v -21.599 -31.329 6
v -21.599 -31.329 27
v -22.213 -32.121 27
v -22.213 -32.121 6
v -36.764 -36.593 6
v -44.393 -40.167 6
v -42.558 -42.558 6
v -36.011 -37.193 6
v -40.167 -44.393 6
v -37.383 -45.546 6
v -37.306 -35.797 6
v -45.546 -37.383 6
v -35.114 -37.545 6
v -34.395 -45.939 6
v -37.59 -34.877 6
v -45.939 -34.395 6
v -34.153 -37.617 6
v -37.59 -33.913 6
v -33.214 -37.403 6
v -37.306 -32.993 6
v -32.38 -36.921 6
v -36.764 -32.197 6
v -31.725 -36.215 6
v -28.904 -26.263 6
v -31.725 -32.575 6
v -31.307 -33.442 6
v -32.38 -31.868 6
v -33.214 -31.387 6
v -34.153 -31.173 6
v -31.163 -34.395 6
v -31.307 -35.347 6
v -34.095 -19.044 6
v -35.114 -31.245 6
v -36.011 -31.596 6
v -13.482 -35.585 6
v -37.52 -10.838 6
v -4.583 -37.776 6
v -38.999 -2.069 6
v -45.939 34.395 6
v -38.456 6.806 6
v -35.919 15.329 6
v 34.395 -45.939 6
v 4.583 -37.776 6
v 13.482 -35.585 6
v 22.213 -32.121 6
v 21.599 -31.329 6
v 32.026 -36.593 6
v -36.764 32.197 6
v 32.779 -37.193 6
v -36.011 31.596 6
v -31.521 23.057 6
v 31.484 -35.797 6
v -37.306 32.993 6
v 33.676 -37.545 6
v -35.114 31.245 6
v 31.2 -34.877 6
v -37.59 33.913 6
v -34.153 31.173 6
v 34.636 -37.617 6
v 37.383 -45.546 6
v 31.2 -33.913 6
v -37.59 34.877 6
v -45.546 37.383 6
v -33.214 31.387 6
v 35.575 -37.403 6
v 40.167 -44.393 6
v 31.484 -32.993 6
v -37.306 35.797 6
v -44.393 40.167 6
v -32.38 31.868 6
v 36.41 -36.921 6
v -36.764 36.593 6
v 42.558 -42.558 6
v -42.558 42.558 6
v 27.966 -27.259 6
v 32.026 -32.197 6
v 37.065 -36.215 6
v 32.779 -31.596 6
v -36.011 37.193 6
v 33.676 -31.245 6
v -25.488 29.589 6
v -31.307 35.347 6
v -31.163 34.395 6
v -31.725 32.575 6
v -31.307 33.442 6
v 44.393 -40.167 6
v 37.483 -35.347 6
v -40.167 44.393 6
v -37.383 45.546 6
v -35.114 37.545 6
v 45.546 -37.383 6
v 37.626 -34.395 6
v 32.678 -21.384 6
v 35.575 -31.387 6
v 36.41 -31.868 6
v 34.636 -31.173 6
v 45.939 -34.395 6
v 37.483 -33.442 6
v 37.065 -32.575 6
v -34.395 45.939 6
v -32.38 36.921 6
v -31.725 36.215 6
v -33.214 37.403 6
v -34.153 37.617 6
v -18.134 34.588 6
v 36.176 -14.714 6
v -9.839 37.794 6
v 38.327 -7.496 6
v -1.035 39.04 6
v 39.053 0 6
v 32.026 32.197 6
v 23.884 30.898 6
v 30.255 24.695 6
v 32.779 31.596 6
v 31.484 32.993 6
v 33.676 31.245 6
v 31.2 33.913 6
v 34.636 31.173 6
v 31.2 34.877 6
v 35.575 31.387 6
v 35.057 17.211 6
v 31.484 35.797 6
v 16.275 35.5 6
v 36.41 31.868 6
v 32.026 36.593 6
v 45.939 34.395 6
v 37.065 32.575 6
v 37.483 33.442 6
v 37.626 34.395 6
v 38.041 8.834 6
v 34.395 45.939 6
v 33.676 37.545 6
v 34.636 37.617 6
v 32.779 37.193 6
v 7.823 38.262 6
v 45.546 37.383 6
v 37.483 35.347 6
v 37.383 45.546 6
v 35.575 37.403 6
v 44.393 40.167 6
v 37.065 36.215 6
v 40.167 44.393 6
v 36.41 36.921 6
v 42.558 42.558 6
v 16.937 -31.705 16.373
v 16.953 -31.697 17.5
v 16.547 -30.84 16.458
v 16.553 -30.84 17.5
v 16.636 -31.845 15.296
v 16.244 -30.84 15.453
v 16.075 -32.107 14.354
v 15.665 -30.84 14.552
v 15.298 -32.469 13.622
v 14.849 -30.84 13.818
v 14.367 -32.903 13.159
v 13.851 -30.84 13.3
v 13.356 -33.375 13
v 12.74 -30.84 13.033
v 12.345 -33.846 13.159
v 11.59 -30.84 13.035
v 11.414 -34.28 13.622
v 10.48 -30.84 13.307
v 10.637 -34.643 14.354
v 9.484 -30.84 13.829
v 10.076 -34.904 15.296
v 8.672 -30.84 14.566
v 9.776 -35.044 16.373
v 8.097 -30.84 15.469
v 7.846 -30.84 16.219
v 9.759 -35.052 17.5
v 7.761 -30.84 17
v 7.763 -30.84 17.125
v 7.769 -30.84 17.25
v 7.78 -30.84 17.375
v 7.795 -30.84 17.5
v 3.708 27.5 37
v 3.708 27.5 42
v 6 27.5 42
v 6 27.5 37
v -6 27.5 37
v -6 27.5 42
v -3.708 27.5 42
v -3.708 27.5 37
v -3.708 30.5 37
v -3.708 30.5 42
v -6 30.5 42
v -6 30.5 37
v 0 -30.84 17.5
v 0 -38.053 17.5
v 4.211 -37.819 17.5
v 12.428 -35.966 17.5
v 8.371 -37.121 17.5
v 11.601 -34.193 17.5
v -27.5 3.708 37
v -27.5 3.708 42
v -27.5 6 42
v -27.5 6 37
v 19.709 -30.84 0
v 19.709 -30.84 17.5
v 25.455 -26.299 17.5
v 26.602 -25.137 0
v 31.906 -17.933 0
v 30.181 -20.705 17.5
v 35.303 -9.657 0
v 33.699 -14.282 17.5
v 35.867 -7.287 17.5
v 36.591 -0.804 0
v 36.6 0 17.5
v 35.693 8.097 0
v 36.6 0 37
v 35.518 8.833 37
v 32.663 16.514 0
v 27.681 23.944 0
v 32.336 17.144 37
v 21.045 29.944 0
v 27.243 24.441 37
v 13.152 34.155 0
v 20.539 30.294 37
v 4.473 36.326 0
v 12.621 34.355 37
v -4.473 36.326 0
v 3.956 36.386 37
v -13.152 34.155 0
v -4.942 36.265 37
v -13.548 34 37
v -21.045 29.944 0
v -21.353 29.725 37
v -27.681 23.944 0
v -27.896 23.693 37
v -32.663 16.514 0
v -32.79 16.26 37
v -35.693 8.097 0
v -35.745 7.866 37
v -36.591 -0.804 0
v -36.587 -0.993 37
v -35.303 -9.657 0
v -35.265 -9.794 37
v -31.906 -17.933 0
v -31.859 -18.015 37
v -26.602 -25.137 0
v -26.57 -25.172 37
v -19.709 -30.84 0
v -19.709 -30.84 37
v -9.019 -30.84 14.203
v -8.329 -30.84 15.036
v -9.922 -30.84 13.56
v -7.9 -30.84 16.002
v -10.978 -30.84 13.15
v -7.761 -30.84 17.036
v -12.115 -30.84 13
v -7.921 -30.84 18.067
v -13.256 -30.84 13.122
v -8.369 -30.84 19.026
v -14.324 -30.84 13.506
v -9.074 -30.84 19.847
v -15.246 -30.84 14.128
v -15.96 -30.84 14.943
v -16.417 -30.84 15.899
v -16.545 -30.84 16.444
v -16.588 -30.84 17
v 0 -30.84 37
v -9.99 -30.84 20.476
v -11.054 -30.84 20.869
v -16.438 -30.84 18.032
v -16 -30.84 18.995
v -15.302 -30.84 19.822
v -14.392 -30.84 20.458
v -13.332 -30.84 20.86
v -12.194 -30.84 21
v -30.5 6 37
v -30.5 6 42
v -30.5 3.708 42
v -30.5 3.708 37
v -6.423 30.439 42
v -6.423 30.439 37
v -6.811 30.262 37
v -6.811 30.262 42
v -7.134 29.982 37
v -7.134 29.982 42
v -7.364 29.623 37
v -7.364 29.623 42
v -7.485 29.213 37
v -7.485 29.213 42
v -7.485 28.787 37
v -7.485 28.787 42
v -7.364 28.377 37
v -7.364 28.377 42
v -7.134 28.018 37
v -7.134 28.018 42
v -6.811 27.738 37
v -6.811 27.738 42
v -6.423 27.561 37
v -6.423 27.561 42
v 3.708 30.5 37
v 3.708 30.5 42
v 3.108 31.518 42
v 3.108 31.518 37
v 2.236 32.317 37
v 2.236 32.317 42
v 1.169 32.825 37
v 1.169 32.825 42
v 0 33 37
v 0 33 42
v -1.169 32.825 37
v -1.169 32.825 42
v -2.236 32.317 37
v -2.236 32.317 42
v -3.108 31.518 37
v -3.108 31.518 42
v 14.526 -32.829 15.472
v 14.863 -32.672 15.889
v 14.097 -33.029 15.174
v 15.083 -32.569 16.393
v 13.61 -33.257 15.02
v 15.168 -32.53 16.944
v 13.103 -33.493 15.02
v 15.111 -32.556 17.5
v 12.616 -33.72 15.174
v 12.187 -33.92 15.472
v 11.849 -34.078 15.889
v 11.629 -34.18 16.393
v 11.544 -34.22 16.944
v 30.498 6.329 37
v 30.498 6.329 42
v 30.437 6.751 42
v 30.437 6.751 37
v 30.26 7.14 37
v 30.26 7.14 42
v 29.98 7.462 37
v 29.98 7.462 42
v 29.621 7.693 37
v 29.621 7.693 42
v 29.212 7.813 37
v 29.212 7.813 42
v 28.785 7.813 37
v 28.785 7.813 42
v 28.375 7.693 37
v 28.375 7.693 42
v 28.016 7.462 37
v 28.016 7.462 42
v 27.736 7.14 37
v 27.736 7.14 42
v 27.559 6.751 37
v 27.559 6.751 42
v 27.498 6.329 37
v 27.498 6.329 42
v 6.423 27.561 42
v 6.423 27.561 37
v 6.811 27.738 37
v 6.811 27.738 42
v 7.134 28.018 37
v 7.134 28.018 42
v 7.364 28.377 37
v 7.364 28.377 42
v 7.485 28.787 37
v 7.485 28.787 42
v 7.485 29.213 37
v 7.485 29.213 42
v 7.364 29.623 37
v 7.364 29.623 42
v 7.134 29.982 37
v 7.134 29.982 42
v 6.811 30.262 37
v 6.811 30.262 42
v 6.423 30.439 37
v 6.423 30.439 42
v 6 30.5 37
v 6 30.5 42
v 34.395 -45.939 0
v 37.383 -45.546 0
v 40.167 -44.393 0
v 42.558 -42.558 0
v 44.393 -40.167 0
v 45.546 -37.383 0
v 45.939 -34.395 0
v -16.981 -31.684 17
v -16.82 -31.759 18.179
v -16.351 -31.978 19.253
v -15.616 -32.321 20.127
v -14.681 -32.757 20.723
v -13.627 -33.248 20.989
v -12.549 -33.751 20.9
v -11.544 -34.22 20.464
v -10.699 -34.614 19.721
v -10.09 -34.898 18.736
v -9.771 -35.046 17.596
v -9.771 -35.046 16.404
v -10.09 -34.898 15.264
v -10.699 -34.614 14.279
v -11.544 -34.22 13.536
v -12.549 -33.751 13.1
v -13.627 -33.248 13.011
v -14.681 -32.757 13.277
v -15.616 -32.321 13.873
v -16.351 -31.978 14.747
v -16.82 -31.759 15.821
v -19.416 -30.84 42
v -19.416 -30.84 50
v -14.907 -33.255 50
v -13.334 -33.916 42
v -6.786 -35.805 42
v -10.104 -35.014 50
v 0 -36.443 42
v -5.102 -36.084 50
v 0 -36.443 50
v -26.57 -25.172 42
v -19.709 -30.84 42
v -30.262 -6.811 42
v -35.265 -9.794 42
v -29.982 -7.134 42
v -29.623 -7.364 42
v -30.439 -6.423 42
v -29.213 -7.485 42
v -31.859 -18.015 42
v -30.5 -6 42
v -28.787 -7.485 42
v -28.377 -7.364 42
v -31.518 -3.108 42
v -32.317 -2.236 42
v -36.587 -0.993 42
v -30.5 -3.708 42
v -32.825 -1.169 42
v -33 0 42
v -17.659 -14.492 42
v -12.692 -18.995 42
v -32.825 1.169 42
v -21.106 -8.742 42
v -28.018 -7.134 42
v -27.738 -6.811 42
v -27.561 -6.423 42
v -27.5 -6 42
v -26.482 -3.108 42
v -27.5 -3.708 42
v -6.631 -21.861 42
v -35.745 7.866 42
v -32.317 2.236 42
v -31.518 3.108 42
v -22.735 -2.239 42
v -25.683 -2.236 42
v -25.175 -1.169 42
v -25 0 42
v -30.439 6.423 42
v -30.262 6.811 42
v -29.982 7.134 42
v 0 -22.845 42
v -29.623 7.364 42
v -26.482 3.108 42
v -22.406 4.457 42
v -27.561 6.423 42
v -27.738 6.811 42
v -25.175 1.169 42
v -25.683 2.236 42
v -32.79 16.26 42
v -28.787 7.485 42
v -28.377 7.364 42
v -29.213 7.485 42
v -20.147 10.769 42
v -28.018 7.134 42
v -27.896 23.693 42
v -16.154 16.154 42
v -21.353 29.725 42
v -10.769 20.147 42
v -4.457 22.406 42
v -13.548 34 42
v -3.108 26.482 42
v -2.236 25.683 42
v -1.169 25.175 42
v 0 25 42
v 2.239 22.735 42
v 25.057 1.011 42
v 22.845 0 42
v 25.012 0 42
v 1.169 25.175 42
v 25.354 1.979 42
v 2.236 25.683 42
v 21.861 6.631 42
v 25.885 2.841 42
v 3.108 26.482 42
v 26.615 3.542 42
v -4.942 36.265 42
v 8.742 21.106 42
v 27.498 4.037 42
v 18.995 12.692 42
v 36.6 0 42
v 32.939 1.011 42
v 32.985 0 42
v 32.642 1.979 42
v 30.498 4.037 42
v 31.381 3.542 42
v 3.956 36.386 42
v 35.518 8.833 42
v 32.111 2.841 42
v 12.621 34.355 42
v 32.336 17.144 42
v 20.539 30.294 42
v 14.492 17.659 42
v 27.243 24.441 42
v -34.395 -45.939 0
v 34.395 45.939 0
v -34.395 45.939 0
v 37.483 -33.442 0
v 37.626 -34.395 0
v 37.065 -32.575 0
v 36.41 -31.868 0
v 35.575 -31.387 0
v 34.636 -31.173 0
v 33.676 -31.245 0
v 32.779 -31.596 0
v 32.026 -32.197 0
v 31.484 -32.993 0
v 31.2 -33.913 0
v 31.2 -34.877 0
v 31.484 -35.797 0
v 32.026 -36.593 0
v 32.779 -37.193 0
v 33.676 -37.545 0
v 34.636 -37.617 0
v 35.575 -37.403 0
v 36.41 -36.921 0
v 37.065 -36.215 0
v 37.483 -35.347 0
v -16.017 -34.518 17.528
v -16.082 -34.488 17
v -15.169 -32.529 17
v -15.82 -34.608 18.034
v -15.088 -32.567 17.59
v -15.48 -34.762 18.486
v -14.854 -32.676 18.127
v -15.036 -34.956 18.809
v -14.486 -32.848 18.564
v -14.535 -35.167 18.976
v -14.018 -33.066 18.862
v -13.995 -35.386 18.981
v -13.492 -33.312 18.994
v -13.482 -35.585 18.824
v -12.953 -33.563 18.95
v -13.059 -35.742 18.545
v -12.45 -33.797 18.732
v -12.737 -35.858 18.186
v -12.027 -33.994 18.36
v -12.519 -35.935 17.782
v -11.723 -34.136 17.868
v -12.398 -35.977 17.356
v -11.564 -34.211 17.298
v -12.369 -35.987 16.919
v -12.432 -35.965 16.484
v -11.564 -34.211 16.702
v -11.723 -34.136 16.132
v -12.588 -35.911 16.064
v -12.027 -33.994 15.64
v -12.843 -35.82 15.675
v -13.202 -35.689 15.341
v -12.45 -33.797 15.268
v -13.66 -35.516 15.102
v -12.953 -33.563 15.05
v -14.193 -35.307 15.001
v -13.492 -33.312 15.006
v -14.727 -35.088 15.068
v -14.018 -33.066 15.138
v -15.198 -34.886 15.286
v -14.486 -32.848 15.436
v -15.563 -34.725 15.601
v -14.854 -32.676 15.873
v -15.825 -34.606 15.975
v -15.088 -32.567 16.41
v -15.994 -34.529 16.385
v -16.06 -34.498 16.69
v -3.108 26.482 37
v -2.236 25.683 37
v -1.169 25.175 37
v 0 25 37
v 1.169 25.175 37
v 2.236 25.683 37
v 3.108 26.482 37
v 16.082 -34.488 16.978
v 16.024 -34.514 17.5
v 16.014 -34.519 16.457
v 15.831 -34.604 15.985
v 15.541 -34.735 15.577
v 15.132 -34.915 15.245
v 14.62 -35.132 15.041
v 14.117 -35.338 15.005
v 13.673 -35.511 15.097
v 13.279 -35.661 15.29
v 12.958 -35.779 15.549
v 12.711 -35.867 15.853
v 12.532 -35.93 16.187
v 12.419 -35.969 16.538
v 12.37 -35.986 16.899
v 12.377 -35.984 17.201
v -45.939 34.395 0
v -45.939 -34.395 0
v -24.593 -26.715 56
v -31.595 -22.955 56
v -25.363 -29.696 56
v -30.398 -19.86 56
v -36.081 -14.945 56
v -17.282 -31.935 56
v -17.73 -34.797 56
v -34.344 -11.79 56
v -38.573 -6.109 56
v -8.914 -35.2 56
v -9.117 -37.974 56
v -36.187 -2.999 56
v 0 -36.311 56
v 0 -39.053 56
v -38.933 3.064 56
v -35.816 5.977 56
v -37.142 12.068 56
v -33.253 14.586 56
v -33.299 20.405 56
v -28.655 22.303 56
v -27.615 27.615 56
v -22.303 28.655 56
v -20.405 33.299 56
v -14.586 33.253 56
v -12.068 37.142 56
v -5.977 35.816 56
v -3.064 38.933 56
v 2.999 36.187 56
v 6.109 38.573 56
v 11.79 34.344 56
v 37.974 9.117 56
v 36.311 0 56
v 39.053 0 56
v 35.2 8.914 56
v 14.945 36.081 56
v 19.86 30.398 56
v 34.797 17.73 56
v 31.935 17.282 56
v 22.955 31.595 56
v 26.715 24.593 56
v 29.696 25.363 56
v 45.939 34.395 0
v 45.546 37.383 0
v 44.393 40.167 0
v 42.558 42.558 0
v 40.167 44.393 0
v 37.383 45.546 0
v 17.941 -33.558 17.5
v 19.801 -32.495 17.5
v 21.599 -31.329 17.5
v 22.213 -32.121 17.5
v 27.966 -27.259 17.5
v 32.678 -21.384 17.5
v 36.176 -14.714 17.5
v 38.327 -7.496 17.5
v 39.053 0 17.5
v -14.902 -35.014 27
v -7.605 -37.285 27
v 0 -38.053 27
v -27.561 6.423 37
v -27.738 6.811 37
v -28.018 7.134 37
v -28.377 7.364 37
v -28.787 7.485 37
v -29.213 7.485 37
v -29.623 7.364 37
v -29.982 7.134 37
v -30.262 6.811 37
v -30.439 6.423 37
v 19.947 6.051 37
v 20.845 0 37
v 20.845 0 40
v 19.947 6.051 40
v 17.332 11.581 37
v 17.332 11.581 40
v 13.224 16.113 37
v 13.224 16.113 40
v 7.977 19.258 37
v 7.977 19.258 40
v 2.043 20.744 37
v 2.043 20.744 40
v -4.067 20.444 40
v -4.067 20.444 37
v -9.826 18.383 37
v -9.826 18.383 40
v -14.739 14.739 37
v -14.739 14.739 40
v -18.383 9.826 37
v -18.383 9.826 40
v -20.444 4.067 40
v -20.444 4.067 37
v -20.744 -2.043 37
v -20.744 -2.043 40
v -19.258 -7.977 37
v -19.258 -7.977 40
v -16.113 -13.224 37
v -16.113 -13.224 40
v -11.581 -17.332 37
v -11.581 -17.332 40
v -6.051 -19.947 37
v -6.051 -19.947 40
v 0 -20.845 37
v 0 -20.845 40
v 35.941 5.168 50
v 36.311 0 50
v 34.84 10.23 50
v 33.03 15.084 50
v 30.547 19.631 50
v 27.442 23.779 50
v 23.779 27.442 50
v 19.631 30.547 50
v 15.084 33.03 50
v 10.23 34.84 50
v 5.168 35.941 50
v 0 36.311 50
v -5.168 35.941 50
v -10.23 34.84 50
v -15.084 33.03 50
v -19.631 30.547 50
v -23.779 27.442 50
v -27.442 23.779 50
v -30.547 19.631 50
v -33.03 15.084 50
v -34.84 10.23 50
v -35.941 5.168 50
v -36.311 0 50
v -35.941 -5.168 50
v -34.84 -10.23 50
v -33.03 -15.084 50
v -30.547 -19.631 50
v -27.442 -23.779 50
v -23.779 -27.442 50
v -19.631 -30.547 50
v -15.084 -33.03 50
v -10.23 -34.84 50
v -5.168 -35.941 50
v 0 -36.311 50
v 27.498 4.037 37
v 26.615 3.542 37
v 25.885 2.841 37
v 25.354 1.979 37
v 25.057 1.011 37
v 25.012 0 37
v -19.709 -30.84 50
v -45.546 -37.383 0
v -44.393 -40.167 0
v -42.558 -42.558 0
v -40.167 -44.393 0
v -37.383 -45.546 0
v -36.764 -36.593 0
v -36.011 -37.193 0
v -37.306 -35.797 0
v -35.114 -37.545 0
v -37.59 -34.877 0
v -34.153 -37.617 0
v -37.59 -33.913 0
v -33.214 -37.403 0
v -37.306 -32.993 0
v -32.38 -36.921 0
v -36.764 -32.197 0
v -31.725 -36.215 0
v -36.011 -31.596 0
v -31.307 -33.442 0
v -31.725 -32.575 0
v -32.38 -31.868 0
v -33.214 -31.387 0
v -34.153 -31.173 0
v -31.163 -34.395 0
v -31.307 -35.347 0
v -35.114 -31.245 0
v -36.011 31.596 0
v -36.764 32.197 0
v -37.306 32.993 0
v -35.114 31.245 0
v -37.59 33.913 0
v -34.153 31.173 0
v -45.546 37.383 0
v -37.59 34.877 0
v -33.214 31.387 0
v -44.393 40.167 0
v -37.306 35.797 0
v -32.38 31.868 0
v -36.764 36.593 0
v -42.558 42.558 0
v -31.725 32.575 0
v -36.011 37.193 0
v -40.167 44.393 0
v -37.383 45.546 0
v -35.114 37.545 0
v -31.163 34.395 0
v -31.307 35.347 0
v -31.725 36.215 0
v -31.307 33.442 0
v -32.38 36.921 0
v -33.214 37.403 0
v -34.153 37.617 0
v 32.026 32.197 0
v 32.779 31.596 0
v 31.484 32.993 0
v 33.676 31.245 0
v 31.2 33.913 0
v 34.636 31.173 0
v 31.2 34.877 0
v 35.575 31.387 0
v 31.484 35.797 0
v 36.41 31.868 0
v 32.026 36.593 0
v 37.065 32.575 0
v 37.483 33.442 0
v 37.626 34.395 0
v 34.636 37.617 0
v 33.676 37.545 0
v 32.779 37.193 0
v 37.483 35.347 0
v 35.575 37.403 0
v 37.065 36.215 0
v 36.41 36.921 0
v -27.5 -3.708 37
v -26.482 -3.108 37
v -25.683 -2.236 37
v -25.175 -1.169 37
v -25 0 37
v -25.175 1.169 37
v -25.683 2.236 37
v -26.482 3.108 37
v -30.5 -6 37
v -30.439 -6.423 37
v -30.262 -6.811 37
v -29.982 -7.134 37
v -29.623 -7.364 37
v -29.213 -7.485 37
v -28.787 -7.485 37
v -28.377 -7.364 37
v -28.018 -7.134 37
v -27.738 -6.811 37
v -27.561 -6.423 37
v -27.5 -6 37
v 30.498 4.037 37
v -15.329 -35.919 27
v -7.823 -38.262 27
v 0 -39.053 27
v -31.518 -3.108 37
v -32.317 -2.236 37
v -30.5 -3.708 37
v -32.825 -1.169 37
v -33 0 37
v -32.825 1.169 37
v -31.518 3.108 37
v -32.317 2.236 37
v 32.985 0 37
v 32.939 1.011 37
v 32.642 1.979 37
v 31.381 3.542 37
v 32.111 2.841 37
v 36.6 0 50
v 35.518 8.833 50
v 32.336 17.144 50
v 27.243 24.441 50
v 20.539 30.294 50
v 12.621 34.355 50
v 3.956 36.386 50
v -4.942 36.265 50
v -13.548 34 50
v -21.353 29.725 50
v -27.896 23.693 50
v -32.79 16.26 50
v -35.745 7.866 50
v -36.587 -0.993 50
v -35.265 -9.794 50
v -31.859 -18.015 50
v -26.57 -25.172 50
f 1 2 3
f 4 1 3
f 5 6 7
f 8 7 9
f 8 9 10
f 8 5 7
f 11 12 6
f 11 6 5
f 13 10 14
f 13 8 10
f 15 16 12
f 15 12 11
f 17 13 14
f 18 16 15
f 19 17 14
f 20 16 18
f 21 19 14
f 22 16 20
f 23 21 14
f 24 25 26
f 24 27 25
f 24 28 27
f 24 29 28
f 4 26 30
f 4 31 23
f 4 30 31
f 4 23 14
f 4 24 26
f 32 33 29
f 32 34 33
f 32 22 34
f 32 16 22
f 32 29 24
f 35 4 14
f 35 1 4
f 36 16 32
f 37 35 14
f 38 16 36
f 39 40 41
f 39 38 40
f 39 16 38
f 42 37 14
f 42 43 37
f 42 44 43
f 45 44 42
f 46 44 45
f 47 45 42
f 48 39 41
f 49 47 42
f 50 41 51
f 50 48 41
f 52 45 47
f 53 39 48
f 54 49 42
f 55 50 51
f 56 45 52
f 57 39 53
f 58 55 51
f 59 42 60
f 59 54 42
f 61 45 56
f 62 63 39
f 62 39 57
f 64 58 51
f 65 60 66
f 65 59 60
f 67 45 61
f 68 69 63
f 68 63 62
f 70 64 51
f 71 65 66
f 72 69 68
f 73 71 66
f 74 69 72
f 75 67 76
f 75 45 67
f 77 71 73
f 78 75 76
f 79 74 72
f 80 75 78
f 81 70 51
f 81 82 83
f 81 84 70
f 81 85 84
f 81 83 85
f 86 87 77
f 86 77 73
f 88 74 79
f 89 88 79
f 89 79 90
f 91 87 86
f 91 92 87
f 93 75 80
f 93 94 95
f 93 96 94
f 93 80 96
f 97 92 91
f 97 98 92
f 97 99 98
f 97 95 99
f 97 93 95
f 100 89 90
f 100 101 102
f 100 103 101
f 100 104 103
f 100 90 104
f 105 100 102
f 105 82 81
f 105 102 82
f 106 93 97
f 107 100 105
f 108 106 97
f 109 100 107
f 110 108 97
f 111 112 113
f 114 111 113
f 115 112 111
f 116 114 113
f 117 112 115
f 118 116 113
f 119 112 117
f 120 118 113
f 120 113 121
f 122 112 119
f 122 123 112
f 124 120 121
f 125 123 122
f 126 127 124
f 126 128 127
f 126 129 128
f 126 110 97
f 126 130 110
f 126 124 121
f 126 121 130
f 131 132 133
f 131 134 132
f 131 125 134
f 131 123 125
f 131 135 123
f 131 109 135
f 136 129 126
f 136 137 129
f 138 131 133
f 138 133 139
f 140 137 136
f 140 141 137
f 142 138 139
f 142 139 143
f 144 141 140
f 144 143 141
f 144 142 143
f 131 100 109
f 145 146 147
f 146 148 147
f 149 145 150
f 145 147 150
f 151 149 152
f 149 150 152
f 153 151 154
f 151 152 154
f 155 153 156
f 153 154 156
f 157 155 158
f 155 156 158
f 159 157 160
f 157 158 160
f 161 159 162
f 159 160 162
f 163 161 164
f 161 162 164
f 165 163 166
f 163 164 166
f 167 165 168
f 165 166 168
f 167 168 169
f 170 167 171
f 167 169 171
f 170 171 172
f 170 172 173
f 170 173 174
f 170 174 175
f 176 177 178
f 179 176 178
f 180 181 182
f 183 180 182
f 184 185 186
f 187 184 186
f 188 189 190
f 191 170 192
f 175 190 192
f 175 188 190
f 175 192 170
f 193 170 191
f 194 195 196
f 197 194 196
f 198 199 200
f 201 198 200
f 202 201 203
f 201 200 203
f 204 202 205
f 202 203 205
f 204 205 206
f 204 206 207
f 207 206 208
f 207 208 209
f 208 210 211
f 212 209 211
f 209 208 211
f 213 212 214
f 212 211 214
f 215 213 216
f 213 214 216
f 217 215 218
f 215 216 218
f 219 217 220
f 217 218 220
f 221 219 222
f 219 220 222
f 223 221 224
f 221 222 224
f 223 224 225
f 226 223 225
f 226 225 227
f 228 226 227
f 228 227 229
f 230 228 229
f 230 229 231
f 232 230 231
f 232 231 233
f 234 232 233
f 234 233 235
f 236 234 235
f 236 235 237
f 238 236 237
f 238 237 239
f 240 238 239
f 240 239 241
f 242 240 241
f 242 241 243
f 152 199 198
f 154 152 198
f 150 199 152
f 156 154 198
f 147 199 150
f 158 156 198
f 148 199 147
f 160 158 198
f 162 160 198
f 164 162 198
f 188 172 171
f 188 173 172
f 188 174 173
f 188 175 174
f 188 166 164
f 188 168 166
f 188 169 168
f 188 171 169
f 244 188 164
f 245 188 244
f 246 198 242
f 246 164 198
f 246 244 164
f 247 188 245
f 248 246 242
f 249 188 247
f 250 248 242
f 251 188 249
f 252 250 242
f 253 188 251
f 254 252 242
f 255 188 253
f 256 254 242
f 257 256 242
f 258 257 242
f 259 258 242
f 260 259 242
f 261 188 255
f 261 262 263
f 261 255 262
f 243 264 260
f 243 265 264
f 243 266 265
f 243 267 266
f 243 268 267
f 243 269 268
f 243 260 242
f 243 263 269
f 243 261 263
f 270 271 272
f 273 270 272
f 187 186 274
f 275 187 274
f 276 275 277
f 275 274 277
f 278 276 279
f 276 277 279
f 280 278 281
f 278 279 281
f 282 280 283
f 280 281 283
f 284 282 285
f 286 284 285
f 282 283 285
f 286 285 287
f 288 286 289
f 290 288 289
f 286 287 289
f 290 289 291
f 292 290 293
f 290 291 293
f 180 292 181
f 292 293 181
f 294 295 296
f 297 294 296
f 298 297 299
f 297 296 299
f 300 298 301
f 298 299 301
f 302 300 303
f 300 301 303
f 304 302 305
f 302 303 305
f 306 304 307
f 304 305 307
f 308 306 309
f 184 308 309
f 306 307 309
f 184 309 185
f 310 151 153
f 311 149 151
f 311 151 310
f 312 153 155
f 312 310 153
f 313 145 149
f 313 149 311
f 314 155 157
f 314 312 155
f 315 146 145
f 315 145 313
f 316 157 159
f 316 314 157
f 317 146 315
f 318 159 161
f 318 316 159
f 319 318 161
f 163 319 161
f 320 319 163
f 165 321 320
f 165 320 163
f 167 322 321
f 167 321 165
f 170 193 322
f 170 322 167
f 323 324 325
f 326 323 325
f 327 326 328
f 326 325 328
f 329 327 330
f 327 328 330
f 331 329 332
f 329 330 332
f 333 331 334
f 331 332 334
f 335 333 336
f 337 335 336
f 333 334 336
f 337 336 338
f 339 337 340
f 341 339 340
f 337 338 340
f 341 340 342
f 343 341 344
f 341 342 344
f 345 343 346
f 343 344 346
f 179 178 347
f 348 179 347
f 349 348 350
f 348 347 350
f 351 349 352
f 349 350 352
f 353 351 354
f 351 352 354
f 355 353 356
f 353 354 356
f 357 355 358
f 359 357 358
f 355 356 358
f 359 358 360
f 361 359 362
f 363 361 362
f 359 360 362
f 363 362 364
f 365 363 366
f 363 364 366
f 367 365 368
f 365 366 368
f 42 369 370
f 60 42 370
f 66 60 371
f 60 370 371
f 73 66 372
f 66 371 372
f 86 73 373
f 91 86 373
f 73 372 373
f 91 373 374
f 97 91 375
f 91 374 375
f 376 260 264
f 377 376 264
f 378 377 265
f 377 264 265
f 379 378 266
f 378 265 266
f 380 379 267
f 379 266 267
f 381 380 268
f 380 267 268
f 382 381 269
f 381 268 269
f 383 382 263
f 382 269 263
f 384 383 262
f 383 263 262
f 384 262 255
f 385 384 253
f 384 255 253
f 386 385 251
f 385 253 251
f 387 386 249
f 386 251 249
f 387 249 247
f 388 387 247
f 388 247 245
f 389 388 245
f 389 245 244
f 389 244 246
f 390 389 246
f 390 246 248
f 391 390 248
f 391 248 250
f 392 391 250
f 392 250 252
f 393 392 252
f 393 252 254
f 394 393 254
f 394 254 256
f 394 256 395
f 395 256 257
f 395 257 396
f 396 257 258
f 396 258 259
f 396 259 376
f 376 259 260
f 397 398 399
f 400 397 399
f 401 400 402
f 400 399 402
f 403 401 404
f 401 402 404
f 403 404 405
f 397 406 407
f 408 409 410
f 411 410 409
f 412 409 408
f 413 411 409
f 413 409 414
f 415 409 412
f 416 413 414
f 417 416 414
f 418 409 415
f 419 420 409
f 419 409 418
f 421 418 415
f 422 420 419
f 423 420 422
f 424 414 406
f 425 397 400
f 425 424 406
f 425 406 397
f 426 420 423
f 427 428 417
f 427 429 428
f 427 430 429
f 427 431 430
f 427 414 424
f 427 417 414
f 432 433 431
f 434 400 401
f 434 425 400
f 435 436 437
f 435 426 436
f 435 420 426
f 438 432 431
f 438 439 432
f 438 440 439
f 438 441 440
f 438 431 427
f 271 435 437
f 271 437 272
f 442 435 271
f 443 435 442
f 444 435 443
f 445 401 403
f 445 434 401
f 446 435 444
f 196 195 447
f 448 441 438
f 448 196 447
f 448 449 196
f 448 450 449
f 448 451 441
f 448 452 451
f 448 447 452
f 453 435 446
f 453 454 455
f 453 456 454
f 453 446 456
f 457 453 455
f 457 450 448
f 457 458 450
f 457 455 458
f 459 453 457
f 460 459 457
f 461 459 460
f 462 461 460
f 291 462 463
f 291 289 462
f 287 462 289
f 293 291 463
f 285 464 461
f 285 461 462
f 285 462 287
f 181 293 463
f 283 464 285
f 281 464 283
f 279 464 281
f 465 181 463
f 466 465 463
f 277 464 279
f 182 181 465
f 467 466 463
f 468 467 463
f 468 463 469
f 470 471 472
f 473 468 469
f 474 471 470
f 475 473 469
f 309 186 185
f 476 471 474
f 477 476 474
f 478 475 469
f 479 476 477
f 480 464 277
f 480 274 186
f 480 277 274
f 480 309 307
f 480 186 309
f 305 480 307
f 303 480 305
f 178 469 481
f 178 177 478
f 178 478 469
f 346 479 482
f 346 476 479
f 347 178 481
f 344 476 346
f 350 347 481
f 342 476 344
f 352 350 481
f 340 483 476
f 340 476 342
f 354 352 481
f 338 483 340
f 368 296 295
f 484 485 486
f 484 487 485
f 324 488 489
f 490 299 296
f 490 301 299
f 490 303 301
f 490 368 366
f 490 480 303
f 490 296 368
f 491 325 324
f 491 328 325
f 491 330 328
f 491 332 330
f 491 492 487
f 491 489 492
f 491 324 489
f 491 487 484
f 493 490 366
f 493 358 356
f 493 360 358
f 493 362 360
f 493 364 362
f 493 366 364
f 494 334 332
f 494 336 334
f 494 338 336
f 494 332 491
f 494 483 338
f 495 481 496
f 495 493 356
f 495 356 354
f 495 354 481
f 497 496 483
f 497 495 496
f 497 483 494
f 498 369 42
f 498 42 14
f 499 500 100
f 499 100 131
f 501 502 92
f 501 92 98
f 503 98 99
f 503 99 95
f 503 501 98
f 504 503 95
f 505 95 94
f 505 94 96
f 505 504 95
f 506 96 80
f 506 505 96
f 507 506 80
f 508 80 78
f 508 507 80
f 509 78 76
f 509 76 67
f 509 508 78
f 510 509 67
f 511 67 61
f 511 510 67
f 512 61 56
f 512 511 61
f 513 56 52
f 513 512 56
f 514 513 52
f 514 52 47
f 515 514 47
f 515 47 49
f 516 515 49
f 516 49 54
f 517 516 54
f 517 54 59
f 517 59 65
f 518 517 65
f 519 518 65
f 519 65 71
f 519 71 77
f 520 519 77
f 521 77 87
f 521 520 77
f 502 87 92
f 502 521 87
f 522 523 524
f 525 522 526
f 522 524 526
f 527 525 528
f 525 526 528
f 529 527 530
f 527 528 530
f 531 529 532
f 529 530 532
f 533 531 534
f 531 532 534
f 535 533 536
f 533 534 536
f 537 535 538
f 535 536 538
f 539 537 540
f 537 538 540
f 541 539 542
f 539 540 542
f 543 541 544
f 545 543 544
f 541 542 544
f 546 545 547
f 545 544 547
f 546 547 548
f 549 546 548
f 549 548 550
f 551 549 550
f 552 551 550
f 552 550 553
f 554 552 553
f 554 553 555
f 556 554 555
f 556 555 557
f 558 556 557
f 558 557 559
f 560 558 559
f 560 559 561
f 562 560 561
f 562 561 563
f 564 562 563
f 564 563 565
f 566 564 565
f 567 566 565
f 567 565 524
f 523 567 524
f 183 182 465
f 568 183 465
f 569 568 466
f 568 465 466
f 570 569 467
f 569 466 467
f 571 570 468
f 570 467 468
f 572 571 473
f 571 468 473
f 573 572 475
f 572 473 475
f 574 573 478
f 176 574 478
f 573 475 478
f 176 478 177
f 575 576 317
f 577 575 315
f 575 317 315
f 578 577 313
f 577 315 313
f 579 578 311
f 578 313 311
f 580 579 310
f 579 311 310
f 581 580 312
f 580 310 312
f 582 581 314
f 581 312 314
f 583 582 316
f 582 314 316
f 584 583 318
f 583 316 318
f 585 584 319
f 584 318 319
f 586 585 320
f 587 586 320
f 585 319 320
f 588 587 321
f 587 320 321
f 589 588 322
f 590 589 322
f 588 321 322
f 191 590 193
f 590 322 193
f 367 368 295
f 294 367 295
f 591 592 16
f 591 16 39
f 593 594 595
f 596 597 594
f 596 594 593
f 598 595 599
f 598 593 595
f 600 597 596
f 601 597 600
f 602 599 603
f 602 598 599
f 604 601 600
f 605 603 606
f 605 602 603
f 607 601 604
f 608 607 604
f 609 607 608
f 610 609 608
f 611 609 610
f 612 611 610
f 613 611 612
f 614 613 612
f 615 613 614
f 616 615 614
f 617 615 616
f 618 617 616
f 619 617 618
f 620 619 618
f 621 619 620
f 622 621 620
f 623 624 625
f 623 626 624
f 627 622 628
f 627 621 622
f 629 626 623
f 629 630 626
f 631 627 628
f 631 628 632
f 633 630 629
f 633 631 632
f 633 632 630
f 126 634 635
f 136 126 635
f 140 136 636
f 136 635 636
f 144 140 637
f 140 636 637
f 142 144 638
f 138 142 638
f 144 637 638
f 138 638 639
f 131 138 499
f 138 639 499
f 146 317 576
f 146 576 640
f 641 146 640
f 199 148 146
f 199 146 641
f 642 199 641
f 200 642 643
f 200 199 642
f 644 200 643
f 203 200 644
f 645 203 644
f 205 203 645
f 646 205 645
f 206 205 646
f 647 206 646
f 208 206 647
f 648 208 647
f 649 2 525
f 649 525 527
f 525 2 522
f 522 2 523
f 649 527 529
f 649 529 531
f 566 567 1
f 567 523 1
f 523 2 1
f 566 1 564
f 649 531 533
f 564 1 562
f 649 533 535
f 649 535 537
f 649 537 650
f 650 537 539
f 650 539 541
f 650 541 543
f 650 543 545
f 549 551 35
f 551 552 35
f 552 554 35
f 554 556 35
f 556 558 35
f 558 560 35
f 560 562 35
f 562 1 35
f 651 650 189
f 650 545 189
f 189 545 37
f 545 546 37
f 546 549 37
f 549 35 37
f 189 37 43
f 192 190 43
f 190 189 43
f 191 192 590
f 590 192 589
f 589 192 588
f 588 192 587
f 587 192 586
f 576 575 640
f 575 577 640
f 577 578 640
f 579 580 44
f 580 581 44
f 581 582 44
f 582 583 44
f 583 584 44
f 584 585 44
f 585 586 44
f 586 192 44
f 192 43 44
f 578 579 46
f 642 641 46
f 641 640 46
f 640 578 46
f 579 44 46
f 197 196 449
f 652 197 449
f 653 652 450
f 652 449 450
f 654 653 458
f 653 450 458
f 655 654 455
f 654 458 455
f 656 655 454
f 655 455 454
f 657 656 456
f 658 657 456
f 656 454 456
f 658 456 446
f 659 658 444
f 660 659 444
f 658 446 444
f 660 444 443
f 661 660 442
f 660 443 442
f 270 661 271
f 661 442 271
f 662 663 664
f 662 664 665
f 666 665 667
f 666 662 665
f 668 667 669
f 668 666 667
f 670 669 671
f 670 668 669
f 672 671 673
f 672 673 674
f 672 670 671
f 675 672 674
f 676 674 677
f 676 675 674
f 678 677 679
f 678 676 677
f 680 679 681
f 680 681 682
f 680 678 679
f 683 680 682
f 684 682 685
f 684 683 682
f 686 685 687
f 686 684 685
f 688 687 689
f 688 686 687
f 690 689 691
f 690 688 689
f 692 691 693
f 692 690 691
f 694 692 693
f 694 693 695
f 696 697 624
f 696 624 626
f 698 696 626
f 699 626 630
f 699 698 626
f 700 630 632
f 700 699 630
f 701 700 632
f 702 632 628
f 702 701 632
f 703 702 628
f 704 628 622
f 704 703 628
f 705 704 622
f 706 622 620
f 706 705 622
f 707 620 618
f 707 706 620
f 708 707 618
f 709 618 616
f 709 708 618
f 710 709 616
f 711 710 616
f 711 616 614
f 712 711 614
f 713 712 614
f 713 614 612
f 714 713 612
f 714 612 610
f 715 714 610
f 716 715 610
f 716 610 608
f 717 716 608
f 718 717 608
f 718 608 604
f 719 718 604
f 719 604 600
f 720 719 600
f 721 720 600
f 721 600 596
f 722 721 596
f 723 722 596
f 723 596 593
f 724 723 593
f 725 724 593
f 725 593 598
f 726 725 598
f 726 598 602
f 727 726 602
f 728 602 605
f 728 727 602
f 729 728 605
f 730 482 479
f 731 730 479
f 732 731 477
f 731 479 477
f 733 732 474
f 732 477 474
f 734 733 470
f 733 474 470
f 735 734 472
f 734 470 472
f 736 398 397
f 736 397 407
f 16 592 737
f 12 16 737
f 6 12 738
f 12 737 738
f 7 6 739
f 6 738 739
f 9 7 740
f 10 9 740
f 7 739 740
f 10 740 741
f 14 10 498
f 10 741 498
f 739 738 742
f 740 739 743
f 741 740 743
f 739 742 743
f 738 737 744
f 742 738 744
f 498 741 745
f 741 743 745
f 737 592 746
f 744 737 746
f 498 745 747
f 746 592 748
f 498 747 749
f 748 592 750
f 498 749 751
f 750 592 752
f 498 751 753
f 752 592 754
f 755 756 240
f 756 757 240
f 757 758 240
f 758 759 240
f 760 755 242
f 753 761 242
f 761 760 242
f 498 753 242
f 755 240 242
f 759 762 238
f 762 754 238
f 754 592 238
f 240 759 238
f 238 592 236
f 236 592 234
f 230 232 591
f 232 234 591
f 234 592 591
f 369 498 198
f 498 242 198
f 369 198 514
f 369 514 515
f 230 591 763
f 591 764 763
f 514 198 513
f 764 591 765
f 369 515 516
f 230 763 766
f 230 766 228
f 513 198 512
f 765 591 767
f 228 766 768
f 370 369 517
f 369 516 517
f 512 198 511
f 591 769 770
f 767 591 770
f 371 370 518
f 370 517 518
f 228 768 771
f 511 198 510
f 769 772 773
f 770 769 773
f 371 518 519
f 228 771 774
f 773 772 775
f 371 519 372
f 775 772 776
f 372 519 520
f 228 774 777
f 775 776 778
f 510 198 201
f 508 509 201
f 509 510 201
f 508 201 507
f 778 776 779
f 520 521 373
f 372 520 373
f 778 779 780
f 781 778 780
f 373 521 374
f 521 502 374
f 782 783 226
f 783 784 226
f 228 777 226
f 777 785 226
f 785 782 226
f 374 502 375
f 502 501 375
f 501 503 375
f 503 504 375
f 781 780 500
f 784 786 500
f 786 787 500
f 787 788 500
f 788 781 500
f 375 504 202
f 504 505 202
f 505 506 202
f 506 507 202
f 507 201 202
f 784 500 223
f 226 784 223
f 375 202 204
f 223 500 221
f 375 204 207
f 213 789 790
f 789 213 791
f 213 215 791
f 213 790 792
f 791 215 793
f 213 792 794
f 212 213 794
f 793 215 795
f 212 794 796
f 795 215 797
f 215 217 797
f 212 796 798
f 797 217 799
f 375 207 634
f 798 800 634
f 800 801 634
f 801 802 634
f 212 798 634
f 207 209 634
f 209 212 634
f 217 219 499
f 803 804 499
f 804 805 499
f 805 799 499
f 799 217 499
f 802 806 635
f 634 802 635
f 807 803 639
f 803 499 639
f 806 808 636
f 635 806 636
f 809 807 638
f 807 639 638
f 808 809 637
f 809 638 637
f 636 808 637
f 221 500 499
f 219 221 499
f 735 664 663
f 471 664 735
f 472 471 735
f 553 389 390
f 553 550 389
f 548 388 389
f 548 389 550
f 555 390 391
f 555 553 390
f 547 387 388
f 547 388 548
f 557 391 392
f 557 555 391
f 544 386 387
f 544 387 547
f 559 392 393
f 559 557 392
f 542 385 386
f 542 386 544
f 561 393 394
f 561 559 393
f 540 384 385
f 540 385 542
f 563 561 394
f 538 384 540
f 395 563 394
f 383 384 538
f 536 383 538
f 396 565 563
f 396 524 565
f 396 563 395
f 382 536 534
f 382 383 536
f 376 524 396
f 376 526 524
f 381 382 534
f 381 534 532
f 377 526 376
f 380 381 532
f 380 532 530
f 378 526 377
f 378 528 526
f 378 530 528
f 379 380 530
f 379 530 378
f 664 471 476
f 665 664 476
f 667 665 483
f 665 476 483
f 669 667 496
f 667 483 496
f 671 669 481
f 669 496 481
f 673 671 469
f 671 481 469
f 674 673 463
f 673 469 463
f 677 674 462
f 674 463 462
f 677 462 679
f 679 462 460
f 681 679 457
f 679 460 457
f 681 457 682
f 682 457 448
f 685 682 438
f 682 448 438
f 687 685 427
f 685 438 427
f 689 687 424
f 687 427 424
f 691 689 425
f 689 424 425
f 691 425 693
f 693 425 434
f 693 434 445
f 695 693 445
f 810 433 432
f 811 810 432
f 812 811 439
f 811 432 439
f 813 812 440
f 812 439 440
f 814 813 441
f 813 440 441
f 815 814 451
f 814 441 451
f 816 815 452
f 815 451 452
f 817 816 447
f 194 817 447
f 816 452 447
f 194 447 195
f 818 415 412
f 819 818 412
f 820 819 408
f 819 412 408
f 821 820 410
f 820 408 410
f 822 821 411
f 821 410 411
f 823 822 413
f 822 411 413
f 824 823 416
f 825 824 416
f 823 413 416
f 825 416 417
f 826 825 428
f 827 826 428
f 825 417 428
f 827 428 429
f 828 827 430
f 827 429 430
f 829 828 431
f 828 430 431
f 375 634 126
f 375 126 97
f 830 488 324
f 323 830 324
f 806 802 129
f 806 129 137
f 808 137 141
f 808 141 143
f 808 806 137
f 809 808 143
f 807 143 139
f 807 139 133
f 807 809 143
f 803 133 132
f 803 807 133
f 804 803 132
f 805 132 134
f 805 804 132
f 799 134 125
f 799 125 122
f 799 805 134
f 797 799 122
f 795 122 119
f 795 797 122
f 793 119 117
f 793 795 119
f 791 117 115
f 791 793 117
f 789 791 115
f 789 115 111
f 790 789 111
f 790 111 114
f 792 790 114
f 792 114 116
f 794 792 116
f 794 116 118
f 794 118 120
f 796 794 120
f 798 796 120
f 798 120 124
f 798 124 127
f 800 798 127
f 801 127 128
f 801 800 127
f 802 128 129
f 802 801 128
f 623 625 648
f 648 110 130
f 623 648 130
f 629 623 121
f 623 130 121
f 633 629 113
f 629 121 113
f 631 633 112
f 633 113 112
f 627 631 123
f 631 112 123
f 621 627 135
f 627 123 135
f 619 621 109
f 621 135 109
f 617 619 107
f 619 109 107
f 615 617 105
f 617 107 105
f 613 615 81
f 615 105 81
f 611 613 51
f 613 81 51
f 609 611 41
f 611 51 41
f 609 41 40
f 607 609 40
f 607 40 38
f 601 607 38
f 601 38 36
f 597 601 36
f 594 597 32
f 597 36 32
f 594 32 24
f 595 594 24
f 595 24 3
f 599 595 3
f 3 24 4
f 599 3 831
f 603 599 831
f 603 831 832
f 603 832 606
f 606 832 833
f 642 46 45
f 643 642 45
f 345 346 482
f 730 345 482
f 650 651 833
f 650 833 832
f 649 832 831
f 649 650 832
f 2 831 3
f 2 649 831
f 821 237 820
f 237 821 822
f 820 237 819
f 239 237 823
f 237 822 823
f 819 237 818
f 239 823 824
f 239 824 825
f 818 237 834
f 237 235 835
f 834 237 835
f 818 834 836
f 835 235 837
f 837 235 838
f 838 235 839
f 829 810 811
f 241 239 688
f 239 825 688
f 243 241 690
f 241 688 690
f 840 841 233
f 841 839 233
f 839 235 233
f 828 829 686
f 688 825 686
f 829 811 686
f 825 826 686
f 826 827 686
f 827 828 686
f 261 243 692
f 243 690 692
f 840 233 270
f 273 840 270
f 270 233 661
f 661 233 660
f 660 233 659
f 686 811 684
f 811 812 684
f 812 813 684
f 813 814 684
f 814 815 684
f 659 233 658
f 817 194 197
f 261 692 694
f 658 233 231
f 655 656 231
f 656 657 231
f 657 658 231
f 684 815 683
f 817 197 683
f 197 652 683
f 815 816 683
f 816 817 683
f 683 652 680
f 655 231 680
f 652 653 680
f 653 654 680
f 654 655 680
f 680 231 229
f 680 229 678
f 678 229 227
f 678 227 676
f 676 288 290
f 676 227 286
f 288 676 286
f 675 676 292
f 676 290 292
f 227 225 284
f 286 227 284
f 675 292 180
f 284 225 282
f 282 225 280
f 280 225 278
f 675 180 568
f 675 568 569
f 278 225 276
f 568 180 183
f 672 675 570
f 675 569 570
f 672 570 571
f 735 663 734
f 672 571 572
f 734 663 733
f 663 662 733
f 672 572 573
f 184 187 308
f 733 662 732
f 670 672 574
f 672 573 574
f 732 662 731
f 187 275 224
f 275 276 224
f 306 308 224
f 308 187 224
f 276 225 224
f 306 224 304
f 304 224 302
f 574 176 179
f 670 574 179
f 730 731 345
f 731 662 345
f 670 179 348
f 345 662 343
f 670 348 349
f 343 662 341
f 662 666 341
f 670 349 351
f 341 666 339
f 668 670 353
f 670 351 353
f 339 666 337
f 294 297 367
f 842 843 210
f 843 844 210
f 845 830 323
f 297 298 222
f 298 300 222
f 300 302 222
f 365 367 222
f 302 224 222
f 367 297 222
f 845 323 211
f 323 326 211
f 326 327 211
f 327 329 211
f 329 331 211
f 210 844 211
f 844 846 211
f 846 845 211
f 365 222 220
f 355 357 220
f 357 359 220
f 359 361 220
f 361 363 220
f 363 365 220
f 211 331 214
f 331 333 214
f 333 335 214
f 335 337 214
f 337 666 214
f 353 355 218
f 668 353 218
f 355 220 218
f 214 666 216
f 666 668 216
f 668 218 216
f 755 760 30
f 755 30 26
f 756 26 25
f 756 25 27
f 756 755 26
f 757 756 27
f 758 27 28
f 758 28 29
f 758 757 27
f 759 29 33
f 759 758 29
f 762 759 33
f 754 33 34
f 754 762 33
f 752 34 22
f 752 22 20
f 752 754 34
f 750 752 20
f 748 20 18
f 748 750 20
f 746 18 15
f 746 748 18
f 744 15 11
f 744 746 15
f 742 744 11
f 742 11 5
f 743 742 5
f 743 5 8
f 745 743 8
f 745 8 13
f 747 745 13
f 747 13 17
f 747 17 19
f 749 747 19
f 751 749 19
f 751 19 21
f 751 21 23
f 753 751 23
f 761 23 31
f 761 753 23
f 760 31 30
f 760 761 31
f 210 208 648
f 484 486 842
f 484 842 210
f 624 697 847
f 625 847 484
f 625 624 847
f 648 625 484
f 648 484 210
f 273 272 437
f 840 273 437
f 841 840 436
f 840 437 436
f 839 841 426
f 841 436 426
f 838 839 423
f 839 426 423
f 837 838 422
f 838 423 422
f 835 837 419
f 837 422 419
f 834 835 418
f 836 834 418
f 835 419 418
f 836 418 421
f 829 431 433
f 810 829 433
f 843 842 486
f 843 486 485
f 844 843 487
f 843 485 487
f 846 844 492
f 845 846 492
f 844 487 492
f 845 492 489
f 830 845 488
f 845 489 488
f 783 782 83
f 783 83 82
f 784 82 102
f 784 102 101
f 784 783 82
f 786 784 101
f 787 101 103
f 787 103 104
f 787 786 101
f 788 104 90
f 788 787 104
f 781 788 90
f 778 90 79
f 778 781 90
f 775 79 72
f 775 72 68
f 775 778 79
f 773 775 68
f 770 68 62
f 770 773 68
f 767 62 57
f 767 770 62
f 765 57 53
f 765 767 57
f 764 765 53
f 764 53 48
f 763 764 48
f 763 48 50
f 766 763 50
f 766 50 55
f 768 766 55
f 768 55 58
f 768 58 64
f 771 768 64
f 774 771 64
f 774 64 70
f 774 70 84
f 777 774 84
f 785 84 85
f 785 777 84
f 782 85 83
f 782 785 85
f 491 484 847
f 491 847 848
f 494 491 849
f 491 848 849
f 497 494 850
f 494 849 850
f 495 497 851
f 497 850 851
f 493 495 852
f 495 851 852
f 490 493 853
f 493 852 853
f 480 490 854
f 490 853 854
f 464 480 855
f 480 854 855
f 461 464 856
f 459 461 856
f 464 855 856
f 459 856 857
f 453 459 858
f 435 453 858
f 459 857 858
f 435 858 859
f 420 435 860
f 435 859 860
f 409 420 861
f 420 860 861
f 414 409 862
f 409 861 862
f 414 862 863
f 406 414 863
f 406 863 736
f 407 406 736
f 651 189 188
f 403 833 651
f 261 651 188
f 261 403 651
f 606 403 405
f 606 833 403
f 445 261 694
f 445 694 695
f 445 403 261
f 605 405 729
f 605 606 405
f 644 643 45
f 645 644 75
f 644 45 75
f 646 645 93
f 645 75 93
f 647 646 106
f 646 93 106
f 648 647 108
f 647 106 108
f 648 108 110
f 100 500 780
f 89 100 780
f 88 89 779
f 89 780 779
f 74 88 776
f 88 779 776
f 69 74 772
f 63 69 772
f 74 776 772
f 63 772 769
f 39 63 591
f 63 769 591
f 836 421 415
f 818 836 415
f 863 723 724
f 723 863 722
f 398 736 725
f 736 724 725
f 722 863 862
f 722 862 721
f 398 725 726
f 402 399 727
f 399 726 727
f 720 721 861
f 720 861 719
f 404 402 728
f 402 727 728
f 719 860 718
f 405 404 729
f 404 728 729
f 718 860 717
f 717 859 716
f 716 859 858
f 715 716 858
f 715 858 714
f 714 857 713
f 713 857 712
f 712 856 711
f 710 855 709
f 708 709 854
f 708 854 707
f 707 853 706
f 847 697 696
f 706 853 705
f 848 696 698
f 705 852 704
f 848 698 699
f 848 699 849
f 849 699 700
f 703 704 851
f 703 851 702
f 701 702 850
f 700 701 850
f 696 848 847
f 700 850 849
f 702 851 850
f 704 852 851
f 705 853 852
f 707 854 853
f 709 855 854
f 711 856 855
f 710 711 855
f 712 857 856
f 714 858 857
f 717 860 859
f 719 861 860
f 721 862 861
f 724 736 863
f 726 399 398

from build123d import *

# Parameters (mm, degrees)
SKETCH_R        = 3.231406
PAD_DEPTH       = 6
SKETCH001_R     = 39.053421
SKETCH001_R_2   = 36.311054
PAD001_DEPTH    = 50
POCKET_DEPTH    = 21
PAD002_DEPTH    = 44
SKETCH005_R     = 4
POCKET001_DEPTH = 8
SKETCH004_R     = 4
POCKET002_DEPTH = 8
SKETCH006_R     = 2
POCKET003_DEPTH = 33.1588870995
SKETCH007_R     = 2
POCKET004_DEPTH = 33.1588870995
POCKET005_DEPTH = 50.001
SKETCH009_R     = 36.442774
POCKET006_DEPTH = 13
SKETCH010_R     = 37.170227
SKETCH010_R_2   = 20.844548
PAD003_DEPTH    = 5
CHAMFER_SIZE    = 2
POCKET007_DEPTH = 5
SKETCH013_W     = 50.953362
SKETCH013_H     = 47.461643
POCKET008_DEPTH = 24.5


with BuildPart() as part:
    # Sketch → Pad (new body)
    with BuildSketch(Plane.XY):
        with BuildLine():
            ThreePointArc((34.394901, -45.939491), (42.558158875, -42.558158875), (45.939491, -34.394901))
            Line((45.939491, 34.394901), (45.939491, -34.394901))
            ThreePointArc((45.939491, 34.394901), (42.558158875, 42.558158875), (34.394901, 45.939491))
            Line((-34.394901, 45.939491), (34.394901, 45.939491))
            ThreePointArc((-34.394901, 45.939491), (-42.558158875, 42.558158875), (-45.939491, 34.394901))
            Line((-45.939491, -34.394901), (-45.939491, 34.394901))
            ThreePointArc((-45.939491, -34.394901), (-42.558158875, -42.558158875), (-34.394901, -45.939491))
            Line((34.394901, -45.939491), (-34.394901, -45.939491))
        make_face()
        with Locations((-34.394901, 34.394901)):
            Circle(SKETCH_R, mode=Mode.SUBTRACT)
        with Locations((34.394901, 34.394901)):
            Circle(SKETCH_R, mode=Mode.SUBTRACT)
        with Locations((-34.394901, -34.394901)):
            Circle(SKETCH_R, mode=Mode.SUBTRACT)
        with Locations((34.394901, -34.394901)):
            Circle(SKETCH_R, mode=Mode.SUBTRACT)
    extrude(amount=PAD_DEPTH)

    # Sketch001 (on Face14 of Pad) → Pad001 (join)
    with BuildSketch(Plane.XY.offset(6)):
        Circle(SKETCH001_R)
        Circle(SKETCH001_R_2, mode=Mode.SUBTRACT)
    extrude(amount=PAD001_DEPTH)

    # Sketch002 (on Face14 of Pad) → Pocket (cut)
    with BuildSketch(Plane.XY.offset(6)):
        with BuildLine():
            ThreePointArc((-21.5988223559, -31.3292084741), (0, -38.0529687512), (21.5988223559, -31.3292084741))
            Line((21.5988223559, -31.3292084741), (22.7946876619, -32.8694723778))
            ThreePointArc((-22.7946613357, -32.8694906348), (1.60187e-05, -40), (22.7946876619, -32.8694723778))
            Line((-21.5988223559, -31.3292084741), (-22.7946613357, -32.8694906348))
        make_face()
    extrude(amount=POCKET_DEPTH, mode=Mode.SUBTRACT)

    # Sketch003 (on Face24 of Pocket) → Pad002 (join)
    with BuildSketch(Plane.XY.offset(6)):
        with BuildLine():
            ThreePointArc((-33.0264474223, -15.3752616453), (0, -36.43), (33.0264474223, -15.3752616453))
            Line((0, -30.775747), (33.0264474223, -15.3752616453))
            Line((-33.0264474223, -15.3752616453), (0, -30.775747))
        make_face()
    extrude(amount=PAD002_DEPTH)

    # Sketch005 (on Face27 of Pad002) → Pocket001 (cut)
    with BuildSketch(Plane(origin=(11.7877949861, -25.2790079252, 0), x_dir=(-0.906307787, -0.4226182617, 0), z_dir=(-0.4226182617, 0.906307787, 0))):
        with Locations((2, 17)):
            Circle(SKETCH005_R)
    extrude(amount=-POCKET001_DEPTH, mode=Mode.SUBTRACT)

    # Sketch004 (on Face25 of Pad002) → Pocket002 (cut)
    with BuildSketch(Plane(origin=(-11.7877949861, -25.2790079252, 0), x_dir=(-0.906307787, 0.4226182617, 0), z_dir=(0.4226182617, 0.906307787, 0))):
        with Locations((-2, 17)):
            Circle(SKETCH004_R)
    extrude(amount=-POCKET002_DEPTH, mode=Mode.SUBTRACT)

    # Sketch006 (on Face27 of Pad002) → Pocket003 (cut, through all)
    with BuildSketch(Plane(origin=(11.7877949861, -25.2790079252, 0), x_dir=(-0.906307787, -0.4226182617, 0), z_dir=(-0.4226182617, 0.906307787, 0))):
        with Locations((2, 17)):
            Circle(SKETCH006_R)
    extrude(amount=-POCKET003_DEPTH, mode=Mode.SUBTRACT)

    # Sketch007 (on Face25 of Pad002) → Pocket004 (cut, through all)
    with BuildSketch(Plane(origin=(-11.7877949861, -25.2790079252, 0), x_dir=(-0.906307787, 0.4226182617, 0), z_dir=(0.4226182617, 0.906307787, 0))):
        with Locations((-2, 17)):
            Circle(SKETCH007_R)
    extrude(amount=-POCKET004_DEPTH, mode=Mode.SUBTRACT)

    # Sketch008 (on Face28 of Pocket004) → Pocket005 (cut, through all)
    with BuildSketch(Plane.XY.offset(50)):
        with BuildLine():
            ThreePointArc((19.7091874975, -30.8400377462), (0, 36.6), (-19.7091874975, -30.8400377462))
            Line((19.7091874975, -30.8400377462), (-19.7091874975, -30.8400377462))
        make_face()
    extrude(amount=-POCKET005_DEPTH, mode=Mode.SUBTRACT)

    # Sketch009 (on Face20 of Pocket005) → Pocket006 (cut)
    with BuildSketch(Plane.XY.offset(50)):
        Circle(SKETCH009_R)
    extrude(amount=-POCKET006_DEPTH, mode=Mode.SUBTRACT)

    # Sketch010 (on Face21 of Pocket006) → Pad003 (join)
    with BuildSketch(Plane.XY.offset(37)):
        Circle(SKETCH010_R)
        Circle(SKETCH010_R_2, mode=Mode.SUBTRACT)
    extrude(amount=PAD003_DEPTH)

    # Chamfer
    chamfer_edges = [part.edges().sort_by_distance(p)[0] for p in [
        (-20.844548, 0, 42),
    ]]
    chamfer(chamfer_edges, length=CHAMFER_SIZE)

    # Sketch012 (on Face4 of Chamfer) → Pocket007 (cut)
    with BuildSketch(Plane.XY.offset(42)):
        with BuildLine():
            ThreePointArc((-30.5, 3.7080992435), (-33, 0), (-30.5, -3.7080992435))
            Line((-30.5, -3.7080992435), (-30.5, -6))
            ThreePointArc((-30.5, -6), (-29, -7.5), (-27.5, -6))
            Line((-27.5, -6), (-27.5, -3.7080992435))
            ThreePointArc((-27.5, -3.7080992435), (-25, 0), (-27.5, 3.7080992435))
            Line((-27.5, 3.7080992435), (-27.5, 6))
            ThreePointArc((-27.5, 6), (-29, 7.5), (-30.5, 6))
            Line((-30.5, 6), (-30.5, 3.7080992435))
        make_face()
        with BuildLine():
            ThreePointArc((-3.7080992435, 27.5), (0, 25), (3.7080992435, 27.5))
            Line((3.7080992435, 27.5), (6, 27.5))
            ThreePointArc((6, 27.5), (7.5, 29), (6, 30.5))
            Line((6, 30.5), (3.7080992435, 30.5))
            ThreePointArc((3.7080992435, 30.5), (0, 33), (-3.7080992435, 30.5))
            Line((-3.7080992435, 30.5), (-6, 30.5))
            ThreePointArc((-6, 30.5), (-7.5, 29), (-6, 27.5))
            Line((-6, 27.5), (-3.7080992435, 27.5))
        make_face()
        with BuildLine():
            ThreePointArc((27.4981368357, 4.0368241404), (24.9981368357, 0.3287248968), (27.4981368357, -3.3793743467))
            Line((27.4981368357, -3.3793743467), (27.4981368357, -5.6712751032))
            ThreePointArc((27.4981368357, -5.6712751032), (28.9981368357, -7.1712751032), (30.4981368357, -5.6712751032))
            Line((30.4981368357, -5.6712751032), (30.4981368357, -3.3793743467))
            ThreePointArc((30.4981368357, -3.3793743467), (32.9981368357, 0.3287248968), (30.4981368357, 4.0368241404))
            Line((30.4981368357, 4.0368241404), (30.4981368357, 6.3287248968))
            ThreePointArc((30.4981368357, 6.3287248968), (28.9981368357, 7.8287248968), (27.4981368357, 6.3287248968))
            Line((27.4981368357, 6.3287248968), (27.4981368357, 4.0368241404))
        make_face()
    extrude(amount=-POCKET007_DEPTH, mode=Mode.SUBTRACT)

    # Sketch013 (on Face4 of Pocket007) → Pocket008 (cut, symmetric)
    with BuildSketch(Plane.XY.offset(42)):
        with Locations((25.476681, -23.7308215)):
            Rectangle(SKETCH013_W, SKETCH013_H)
    extrude(amount=POCKET008_DEPTH, both=True, mode=Mode.SUBTRACT)


solid = part.part
